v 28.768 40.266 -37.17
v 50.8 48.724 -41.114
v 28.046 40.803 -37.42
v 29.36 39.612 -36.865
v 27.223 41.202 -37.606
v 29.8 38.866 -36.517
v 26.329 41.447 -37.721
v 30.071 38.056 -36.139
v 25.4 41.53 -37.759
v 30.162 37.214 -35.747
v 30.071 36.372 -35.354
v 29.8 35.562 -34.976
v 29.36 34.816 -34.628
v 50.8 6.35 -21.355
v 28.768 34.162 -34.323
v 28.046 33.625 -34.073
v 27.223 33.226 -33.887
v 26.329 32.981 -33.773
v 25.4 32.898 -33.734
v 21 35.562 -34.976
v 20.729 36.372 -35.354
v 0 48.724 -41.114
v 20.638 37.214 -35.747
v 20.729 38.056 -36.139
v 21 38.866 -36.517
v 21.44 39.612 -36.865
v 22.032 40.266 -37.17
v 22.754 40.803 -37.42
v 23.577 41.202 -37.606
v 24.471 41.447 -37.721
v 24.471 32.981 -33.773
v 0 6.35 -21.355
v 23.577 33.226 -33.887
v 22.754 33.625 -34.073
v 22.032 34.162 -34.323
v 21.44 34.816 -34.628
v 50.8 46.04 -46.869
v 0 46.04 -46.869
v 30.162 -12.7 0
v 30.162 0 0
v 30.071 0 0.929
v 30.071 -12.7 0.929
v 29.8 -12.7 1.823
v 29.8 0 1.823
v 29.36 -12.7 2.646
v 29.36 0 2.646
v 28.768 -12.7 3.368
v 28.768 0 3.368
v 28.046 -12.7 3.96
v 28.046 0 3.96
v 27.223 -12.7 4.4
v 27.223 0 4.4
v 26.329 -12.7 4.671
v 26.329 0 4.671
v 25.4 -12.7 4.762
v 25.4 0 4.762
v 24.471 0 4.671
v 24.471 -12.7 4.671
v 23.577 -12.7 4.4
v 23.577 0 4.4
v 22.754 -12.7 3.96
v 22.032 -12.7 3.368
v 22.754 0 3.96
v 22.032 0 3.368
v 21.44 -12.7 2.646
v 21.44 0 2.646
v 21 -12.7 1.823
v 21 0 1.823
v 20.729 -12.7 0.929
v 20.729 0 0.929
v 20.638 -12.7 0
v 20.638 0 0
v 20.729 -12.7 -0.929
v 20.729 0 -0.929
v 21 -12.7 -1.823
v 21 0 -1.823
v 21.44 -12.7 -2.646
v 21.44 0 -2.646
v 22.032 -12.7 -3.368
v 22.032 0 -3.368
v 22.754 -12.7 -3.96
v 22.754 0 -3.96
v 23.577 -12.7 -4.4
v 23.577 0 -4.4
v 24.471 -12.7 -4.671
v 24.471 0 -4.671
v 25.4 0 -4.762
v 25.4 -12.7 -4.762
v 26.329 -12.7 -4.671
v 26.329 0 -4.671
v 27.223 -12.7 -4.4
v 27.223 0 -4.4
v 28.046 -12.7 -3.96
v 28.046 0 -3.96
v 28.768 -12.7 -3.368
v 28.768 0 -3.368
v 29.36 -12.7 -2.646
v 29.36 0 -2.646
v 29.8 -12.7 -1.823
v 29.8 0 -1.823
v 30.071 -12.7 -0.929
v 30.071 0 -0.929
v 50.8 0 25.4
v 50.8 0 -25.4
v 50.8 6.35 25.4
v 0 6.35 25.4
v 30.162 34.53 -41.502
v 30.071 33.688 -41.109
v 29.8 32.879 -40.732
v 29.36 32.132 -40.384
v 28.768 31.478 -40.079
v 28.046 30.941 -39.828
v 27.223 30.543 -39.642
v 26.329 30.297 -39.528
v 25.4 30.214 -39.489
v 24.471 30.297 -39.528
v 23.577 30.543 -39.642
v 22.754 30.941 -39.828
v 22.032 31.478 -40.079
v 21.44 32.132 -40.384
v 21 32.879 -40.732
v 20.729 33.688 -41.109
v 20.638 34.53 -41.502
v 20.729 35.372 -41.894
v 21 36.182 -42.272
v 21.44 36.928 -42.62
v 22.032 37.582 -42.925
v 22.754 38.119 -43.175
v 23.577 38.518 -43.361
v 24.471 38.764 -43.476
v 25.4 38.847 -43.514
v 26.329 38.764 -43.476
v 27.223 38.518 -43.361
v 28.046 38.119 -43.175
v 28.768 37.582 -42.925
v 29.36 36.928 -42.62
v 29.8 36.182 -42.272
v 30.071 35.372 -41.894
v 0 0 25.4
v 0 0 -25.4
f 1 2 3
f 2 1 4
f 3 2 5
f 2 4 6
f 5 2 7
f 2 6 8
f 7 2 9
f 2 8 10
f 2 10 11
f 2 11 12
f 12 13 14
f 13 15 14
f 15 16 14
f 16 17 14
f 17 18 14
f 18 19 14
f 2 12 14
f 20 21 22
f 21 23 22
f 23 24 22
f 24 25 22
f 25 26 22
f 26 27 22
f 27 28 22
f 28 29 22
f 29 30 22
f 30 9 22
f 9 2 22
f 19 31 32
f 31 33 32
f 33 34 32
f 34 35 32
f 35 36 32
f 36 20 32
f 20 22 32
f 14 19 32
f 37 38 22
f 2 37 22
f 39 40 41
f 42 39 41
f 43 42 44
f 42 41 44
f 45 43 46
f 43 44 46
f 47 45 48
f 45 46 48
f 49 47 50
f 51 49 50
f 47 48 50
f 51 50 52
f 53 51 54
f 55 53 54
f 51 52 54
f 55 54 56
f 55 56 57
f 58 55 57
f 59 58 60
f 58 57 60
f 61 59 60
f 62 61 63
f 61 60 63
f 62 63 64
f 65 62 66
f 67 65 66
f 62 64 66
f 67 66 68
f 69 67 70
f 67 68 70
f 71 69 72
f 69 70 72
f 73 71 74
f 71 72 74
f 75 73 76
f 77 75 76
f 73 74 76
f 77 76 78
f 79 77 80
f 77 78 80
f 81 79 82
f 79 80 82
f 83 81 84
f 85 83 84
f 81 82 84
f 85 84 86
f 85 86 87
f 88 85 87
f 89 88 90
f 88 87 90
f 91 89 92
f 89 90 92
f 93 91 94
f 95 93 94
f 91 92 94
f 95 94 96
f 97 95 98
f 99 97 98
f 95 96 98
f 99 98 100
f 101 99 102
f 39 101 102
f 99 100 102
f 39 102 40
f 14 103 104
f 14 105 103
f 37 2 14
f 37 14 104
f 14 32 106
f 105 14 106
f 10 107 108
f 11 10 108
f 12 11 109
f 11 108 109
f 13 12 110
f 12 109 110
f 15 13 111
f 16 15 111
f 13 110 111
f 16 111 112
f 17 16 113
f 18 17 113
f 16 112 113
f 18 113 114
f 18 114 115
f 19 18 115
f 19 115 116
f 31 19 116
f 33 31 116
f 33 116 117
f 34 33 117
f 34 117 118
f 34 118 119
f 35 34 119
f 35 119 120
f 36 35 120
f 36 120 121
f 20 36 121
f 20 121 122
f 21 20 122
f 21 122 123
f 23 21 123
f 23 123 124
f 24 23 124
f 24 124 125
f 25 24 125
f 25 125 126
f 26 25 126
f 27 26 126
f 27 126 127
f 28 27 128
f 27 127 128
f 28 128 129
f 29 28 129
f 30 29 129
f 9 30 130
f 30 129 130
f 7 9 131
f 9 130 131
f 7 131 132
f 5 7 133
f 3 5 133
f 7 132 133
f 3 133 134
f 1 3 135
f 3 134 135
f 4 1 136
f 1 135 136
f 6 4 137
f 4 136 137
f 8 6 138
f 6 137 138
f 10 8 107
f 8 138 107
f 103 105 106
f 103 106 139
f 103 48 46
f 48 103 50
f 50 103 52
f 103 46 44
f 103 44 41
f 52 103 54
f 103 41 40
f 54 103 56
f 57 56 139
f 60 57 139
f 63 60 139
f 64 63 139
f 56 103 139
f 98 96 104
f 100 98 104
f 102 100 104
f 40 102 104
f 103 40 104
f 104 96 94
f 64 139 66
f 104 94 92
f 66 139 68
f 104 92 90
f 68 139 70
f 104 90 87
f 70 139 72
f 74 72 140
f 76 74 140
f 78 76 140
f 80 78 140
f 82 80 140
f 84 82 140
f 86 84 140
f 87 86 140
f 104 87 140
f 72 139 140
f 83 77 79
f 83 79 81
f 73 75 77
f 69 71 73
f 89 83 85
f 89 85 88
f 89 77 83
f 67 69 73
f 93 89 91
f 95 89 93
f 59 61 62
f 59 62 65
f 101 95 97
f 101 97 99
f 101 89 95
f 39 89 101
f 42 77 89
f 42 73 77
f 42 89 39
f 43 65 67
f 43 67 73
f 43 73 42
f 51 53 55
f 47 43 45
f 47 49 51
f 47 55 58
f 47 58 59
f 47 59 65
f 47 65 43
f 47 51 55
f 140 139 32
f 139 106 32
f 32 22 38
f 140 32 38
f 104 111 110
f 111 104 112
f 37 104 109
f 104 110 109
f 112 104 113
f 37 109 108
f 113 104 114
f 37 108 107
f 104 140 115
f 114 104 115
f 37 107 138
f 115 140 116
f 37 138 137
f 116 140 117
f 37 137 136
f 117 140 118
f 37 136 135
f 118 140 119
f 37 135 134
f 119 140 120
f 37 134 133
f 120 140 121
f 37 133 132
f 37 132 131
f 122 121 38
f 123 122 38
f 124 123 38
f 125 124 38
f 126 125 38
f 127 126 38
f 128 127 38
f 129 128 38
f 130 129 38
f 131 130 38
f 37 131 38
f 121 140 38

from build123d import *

# Parameters (mm, degrees)
BOSS_EXTRUDE2_DEPTH = 50.8
CUT_EXTRUDE1_REACH  = 68.632
SKETCH3_R           = 4.7625
SKETCH4_R           = 4.7625
BOSS_EXTRUDE3_DEPTH = 12.7


with BuildPart() as part:
    # Sketch2 → Boss-Extrude2 (new body)
    with BuildSketch(Plane(origin=(0, 0, 0), x_dir=(0, 0, -1), z_dir=(1, 0, 0))):
        Polygon((-25.4, 0), (25.4, 0), (46.869007696, 46.040435581), (41.113953249, 48.724061544), (21.354603844, 6.35), (-25.4, 6.35), align=None)
    extrude(amount=BOSS_EXTRUDE2_DEPTH)

    # Sketch3 → Cut-Extrude1 (cut, up to next)
    with BuildSketch(Plane(origin=(0, -9.728764428, -20.863402643), x_dir=(1, 0, 0), z_dir=(0, -0.422618262, -0.906307787)), mode=Mode.PRIVATE) as cut_extrude1_sk1:
        with Locations((25.4, -48.834503848)):
            Circle(SKETCH3_R)
    cut_extrude1_tool1 = extrude(cut_extrude1_sk1.sketch, amount=-CUT_EXTRUDE1_REACH, mode=Mode.PRIVATE) & part.part
    add(cut_extrude1_tool1.solids().sort_by_distance((25.4, 34.530327, -41.501756))[0], mode=Mode.SUBTRACT)

    # Sketch4 → Boss-Extrude3 (add)
    with BuildSketch(Plane.XZ):
        with Locations((25.4, 0)):
            Circle(SKETCH4_R)
    extrude(amount=BOSS_EXTRUDE3_DEPTH)


solid = part.part
